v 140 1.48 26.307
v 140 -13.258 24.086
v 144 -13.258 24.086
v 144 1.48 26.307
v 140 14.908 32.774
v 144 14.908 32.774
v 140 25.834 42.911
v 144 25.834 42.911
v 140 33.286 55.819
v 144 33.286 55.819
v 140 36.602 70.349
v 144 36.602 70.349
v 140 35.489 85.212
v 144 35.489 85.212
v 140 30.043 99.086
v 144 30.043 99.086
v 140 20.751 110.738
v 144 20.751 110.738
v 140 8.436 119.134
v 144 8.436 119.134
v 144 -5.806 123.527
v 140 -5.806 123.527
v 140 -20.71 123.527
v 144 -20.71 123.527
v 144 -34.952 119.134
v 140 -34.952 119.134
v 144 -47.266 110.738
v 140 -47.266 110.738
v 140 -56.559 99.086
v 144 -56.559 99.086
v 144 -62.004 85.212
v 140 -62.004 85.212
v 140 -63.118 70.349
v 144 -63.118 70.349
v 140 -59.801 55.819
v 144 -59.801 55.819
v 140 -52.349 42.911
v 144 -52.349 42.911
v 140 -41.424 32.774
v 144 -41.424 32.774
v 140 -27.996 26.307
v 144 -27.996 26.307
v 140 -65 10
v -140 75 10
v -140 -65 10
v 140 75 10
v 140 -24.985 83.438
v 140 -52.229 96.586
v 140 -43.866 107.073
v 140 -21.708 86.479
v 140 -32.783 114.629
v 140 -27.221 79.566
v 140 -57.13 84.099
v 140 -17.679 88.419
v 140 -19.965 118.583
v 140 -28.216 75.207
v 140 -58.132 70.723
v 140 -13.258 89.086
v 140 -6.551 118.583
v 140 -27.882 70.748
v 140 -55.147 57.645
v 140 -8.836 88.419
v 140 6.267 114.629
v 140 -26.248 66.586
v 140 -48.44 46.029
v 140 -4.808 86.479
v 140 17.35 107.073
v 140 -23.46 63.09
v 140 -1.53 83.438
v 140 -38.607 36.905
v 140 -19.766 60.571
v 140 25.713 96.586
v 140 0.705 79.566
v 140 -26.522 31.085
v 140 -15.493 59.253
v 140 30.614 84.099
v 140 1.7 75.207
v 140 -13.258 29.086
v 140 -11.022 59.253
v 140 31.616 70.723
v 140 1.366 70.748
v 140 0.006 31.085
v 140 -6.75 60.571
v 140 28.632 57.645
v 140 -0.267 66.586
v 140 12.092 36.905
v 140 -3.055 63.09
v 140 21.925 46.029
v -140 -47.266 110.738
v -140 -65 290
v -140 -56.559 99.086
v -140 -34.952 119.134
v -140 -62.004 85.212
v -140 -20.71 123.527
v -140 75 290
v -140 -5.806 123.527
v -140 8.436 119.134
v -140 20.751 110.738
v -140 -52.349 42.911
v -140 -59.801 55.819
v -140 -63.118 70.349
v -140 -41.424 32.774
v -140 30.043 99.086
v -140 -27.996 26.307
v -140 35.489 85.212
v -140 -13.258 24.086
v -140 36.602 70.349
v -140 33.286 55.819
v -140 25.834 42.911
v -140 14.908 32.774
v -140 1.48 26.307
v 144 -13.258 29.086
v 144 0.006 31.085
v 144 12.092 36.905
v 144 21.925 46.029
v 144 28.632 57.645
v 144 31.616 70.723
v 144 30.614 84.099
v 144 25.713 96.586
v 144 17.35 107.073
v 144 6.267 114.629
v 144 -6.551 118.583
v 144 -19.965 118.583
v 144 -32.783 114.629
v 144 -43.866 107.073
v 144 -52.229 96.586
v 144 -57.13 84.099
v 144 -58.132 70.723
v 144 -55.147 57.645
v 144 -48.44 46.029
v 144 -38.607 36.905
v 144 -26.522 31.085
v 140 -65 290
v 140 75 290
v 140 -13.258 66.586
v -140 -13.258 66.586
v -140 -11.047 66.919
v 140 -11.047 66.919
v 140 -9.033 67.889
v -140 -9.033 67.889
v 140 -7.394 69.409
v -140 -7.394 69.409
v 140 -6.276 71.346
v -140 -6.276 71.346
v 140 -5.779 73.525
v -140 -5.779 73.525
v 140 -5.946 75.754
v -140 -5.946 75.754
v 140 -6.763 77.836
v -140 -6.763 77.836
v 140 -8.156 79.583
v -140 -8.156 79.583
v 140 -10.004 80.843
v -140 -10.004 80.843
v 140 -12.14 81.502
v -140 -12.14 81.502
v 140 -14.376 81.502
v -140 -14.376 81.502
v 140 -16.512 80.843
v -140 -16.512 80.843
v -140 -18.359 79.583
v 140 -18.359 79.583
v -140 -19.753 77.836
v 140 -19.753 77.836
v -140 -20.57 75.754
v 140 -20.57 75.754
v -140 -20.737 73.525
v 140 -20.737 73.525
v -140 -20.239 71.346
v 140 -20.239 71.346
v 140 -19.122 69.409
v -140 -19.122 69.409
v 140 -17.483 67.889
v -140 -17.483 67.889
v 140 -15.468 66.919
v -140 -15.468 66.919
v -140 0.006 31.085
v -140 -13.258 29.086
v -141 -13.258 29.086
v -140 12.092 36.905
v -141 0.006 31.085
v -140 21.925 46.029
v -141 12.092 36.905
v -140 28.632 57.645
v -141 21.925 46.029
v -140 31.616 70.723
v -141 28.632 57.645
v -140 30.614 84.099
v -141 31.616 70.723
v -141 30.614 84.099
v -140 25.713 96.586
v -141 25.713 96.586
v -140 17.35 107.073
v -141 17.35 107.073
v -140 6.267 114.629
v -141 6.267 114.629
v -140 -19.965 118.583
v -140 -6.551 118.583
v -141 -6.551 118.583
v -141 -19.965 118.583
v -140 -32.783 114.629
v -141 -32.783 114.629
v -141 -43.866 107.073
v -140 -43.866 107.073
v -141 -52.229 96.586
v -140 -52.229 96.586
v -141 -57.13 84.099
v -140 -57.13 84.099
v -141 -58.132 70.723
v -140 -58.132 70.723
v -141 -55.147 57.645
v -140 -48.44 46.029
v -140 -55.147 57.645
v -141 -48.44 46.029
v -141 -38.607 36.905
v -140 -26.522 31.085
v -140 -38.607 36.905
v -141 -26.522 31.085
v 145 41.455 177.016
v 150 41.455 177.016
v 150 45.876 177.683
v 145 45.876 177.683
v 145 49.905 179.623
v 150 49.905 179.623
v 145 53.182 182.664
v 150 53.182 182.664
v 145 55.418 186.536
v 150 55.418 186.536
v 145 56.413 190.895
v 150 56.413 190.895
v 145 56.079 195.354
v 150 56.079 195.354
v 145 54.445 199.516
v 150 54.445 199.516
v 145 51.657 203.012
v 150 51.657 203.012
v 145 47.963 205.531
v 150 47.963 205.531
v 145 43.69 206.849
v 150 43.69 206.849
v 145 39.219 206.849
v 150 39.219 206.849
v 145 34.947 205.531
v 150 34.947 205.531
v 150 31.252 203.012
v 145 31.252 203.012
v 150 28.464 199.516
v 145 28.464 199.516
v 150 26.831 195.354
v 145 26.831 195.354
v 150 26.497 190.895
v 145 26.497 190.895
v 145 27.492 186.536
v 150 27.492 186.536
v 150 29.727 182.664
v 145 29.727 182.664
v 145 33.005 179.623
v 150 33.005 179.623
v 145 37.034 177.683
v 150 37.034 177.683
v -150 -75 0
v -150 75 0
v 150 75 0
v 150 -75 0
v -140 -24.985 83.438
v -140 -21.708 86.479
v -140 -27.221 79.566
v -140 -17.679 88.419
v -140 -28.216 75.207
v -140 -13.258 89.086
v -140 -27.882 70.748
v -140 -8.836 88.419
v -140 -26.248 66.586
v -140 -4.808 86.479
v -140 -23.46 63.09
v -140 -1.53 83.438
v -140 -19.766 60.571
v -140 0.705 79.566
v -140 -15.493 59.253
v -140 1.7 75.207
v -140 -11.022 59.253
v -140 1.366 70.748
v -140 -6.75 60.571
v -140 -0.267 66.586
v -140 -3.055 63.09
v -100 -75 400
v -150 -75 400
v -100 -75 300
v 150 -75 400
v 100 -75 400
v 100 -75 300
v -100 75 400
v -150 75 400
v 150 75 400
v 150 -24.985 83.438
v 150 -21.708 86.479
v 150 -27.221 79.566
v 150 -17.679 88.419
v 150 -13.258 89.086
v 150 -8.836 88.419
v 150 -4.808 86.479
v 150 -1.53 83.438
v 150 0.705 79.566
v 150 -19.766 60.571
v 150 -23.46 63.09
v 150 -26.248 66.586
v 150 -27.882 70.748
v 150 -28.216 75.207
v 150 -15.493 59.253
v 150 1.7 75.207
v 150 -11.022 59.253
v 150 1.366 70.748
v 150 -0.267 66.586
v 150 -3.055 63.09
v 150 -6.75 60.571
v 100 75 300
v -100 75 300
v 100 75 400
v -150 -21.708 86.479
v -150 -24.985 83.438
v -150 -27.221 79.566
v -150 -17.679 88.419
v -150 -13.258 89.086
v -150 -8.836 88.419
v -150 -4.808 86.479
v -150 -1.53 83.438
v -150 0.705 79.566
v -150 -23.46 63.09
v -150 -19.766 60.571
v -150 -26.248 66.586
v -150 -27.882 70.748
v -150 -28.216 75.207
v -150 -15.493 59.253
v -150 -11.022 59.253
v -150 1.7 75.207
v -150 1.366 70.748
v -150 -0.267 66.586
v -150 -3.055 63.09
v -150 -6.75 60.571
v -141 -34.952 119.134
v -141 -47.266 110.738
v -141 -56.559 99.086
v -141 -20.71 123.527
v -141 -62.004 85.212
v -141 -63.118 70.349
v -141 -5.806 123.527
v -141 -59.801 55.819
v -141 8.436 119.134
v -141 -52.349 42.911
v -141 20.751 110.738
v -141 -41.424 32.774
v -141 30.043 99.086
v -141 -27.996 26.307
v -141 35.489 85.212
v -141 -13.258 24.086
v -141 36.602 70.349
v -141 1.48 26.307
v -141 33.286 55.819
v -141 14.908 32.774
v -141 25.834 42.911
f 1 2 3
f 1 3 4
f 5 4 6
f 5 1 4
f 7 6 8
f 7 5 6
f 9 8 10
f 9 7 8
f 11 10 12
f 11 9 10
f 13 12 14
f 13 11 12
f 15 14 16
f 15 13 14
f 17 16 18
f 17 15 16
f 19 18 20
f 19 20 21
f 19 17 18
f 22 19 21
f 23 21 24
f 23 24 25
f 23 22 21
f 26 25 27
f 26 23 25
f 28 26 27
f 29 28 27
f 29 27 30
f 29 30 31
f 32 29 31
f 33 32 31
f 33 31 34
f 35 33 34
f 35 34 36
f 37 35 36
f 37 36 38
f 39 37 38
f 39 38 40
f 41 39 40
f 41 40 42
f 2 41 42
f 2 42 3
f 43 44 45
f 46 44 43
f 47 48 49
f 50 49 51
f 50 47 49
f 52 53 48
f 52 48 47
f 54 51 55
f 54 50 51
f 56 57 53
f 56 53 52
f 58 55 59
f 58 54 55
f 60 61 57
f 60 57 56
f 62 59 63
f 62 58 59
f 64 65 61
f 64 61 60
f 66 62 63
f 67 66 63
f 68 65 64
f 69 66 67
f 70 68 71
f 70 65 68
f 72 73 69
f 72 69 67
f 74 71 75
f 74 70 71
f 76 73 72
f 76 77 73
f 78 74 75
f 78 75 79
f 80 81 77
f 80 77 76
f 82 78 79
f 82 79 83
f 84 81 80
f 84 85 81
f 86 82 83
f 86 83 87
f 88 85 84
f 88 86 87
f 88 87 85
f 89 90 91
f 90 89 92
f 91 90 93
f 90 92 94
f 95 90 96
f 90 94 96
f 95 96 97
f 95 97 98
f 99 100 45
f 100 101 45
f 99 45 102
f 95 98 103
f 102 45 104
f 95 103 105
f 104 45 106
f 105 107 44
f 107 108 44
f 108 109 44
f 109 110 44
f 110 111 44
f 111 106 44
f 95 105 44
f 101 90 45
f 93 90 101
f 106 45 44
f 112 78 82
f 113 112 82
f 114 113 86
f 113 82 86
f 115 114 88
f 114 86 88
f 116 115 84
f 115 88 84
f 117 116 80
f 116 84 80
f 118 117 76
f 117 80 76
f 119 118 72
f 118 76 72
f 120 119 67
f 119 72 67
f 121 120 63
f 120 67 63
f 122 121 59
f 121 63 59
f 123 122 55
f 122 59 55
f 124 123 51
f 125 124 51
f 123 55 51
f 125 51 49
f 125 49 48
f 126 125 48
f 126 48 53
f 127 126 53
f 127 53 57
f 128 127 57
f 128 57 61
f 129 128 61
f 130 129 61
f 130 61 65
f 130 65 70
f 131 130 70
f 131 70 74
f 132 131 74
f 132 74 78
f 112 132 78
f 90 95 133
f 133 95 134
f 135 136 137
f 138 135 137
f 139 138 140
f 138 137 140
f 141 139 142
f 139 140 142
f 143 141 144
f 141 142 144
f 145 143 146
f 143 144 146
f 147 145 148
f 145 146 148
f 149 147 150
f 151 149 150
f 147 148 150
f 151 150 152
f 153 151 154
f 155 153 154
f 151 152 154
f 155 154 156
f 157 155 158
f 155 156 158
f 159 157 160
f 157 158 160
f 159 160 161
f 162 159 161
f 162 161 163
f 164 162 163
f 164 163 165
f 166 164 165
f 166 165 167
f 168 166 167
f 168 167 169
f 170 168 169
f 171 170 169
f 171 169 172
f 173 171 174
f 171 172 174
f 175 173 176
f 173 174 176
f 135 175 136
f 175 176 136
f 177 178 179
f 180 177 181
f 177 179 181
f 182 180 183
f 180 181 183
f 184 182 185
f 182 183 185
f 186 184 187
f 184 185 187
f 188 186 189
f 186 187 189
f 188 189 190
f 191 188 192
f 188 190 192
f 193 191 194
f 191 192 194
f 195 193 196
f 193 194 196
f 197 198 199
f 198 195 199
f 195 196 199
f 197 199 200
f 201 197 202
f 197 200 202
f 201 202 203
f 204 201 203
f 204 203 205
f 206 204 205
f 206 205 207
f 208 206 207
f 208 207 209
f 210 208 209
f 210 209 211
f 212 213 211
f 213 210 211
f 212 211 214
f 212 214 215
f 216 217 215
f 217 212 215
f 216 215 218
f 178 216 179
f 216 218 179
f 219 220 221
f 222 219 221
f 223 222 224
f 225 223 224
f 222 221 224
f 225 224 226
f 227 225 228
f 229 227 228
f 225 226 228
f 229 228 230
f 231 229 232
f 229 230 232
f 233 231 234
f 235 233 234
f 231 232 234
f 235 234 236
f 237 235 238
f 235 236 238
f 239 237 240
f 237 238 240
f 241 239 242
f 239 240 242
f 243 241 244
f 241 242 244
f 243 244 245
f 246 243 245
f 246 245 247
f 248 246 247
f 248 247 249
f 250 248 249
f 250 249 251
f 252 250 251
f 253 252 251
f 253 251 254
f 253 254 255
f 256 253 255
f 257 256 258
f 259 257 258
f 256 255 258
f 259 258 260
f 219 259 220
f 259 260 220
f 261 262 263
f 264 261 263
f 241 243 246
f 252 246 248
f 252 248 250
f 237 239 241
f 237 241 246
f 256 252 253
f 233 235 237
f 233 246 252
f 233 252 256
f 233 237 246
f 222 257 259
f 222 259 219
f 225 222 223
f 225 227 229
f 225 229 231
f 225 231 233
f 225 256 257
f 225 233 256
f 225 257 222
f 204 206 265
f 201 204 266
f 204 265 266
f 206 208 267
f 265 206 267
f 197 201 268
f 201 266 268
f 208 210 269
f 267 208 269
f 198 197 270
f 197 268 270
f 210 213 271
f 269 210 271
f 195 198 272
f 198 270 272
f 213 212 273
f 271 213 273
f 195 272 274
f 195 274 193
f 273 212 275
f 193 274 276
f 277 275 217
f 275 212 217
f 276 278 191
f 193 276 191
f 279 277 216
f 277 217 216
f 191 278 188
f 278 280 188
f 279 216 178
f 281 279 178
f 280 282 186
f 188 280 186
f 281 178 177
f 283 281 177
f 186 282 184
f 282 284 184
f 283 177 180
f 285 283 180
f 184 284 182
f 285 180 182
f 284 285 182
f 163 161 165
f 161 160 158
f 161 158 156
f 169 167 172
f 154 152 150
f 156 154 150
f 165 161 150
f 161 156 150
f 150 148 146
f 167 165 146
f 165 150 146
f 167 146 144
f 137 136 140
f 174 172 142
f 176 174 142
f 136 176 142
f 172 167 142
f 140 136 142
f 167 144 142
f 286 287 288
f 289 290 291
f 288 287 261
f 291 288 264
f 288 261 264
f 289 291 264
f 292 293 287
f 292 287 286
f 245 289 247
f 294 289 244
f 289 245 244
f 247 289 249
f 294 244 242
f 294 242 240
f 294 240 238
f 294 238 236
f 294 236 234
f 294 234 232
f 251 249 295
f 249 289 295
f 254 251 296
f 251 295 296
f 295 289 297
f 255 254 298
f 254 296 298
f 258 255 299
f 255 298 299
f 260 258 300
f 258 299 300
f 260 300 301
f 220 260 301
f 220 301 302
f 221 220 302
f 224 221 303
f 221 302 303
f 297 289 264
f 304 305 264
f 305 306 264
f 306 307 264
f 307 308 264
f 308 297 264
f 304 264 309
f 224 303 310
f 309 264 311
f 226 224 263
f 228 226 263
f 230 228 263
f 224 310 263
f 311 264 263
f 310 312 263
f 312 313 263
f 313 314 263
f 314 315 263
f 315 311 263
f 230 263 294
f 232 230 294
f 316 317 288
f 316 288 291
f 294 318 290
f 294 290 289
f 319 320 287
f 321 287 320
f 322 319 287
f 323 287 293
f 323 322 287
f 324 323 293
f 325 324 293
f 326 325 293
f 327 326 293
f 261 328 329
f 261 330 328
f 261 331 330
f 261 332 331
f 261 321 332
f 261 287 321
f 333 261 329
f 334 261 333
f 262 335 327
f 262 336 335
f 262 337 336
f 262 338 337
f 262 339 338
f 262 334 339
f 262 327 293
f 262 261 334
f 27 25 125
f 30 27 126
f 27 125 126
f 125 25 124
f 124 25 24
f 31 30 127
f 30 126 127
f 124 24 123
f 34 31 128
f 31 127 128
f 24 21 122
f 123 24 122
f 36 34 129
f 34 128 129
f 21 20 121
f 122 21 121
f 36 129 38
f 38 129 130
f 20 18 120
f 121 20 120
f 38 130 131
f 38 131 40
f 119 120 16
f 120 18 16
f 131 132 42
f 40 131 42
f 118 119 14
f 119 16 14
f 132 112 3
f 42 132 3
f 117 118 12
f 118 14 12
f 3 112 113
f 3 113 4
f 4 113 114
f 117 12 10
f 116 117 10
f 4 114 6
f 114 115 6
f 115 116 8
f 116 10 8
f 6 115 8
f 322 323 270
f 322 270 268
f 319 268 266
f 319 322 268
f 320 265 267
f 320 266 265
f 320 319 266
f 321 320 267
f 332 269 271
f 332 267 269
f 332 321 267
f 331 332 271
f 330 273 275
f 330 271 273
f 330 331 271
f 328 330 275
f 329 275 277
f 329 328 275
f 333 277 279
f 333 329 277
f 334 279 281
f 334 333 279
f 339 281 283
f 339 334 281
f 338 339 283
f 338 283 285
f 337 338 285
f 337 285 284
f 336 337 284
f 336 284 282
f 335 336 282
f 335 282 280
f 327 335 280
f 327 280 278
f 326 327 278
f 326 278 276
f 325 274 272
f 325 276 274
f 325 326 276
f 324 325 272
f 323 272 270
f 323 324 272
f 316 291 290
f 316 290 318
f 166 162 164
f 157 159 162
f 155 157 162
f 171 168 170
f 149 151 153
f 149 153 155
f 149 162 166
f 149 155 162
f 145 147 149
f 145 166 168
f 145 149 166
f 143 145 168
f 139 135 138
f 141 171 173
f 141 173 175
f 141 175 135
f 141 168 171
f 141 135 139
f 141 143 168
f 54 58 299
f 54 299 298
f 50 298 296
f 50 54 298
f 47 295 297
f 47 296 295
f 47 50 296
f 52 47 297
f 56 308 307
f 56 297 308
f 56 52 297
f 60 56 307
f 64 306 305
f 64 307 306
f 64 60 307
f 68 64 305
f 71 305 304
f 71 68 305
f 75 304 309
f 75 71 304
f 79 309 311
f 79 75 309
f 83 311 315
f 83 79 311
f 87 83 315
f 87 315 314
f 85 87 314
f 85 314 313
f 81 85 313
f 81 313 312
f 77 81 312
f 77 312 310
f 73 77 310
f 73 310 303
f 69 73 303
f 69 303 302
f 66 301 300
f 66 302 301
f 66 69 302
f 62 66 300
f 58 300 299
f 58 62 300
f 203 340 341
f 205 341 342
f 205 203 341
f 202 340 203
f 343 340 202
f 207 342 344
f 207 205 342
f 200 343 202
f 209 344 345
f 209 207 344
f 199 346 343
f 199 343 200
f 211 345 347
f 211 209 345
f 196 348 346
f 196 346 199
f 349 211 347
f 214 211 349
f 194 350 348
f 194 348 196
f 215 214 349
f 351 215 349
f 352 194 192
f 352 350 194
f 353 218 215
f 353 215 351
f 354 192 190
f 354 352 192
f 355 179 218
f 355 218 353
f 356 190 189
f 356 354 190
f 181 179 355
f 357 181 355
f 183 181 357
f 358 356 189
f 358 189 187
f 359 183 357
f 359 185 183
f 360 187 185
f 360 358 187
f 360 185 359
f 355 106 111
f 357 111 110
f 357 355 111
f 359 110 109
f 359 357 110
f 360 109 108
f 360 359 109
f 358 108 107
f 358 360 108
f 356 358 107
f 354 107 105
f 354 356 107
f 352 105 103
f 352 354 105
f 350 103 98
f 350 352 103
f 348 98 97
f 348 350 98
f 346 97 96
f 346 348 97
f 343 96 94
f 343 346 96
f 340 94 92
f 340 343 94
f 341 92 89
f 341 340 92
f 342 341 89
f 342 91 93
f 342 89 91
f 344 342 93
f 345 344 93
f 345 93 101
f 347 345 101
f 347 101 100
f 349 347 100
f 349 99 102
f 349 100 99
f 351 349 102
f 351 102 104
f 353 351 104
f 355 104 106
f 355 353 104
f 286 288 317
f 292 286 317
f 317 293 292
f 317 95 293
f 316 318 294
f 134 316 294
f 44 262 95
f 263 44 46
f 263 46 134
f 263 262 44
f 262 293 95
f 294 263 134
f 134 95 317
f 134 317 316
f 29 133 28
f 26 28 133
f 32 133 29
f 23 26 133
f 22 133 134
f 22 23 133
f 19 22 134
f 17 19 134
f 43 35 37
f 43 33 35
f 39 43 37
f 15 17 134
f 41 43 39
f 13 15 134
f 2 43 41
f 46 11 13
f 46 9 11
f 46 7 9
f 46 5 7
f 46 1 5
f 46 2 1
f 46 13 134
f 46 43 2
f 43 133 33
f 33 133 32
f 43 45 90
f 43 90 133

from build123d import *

# Parameters (mm, degrees)
SKETCH1_W               = 300
SKETCH1_H               = 150
BOSS_EXTRUDE1_DEPTH     = 300
SHELL1_T                = -10
CUT_EXTRUDE2_DEPTH      = 284
CUT_EXTRUDE2_DEPTH_BACK = 1
SKETCH2_R               = 50
SKETCH2_R_2             = 45
CUT_EXTRUDE3_DEPTH      = 361
CUT_EXTRUDE3_DEPTH_BACK = 95
SKETCH8_R               = 15
SKETCH9_R               = 7.5
BOSS_EXTRUDE2_DEPTH     = 280
SKETCH14_W              = 50
SKETCH14_H              = 150
BOSS_EXTRUDE4_DEPTH     = 100
SKETCH15_R              = 15
CUT_EXTRUDE6_DEPTH      = 5


with BuildPart() as part:
    # Sketch1 → Boss-Extrude1 (new body)
    with BuildSketch(Plane.XY):
        Rectangle(SKETCH1_W, SKETCH1_H)
    extrude(amount=BOSS_EXTRUDE1_DEPTH)

    # Shell1
    shell1_openings = [part.faces().sort_by_distance(p)[0] for p in [
        (0, 75, 150),
    ]]
    offset(amount=SHELL1_T, openings=shell1_openings, kind=Kind.INTERSECTION)

    # Sketch2 → Cut-Extrude2 (cut, two sides: drawn at the far end of the back side and taken through both)
    with BuildSketch(Plane(origin=(-140, 0, 0), x_dir=(0, 0, -1), z_dir=(1, 0, 0)).offset(-CUT_EXTRUDE2_DEPTH_BACK)):
        with Locations((-74.085565492, -13.257784017)):
            Circle(SKETCH2_R)
        with Locations((-74.085565492, -13.257784017)):
            Circle(SKETCH2_R_2, mode=Mode.SUBTRACT)
    extrude(amount=CUT_EXTRUDE2_DEPTH + CUT_EXTRUDE2_DEPTH_BACK, mode=Mode.SUBTRACT)

    # Sketch8 → Cut-Extrude3 (cut, two sides: drawn at the far end of the back side and taken through both)
    with BuildSketch(Plane(origin=(-140, 0, 0), x_dir=(0, 0, -1), z_dir=(1, 0, 0)).offset(-CUT_EXTRUDE3_DEPTH_BACK)):
        with Locations(Location((-74.085565492, -13.257784017, 0), (0, 0, 180))):
            Circle(SKETCH8_R)
    extrude(amount=CUT_EXTRUDE3_DEPTH + CUT_EXTRUDE3_DEPTH_BACK, mode=Mode.SUBTRACT)

    # Sketch14 → Boss-Extrude4 (add)
    with BuildSketch(Plane.XY.offset(300)):
        with Locations((-125, 0)):
            Rectangle(SKETCH14_W, SKETCH14_H)
        with Locations((125, 0)):
            Rectangle(SKETCH14_W, SKETCH14_H)
    extrude(amount=BOSS_EXTRUDE4_DEPTH)

    # Sketch15 → Cut-Extrude6 (cut)
    with BuildSketch(Plane(origin=(150, 0, 0), x_dir=(0, 0, -1), z_dir=(1, 0, 0))):
        with Locations((-192.016194133, 41.454862356)):
            Circle(SKETCH15_R)
    extrude(amount=-CUT_EXTRUDE6_DEPTH, mode=Mode.SUBTRACT)


with BuildPart() as body_2:
    # Sketch9 → Boss-Extrude2 (new body)
    with BuildSketch(Plane(origin=(-140, 0, 0), x_dir=(0, 0, -1), z_dir=(1, 0, 0))):
        with Locations((-74.085565492, -13.257784017)):
            Circle(SKETCH9_R)
    extrude(amount=BOSS_EXTRUDE2_DEPTH)


solid = Compound([part.part, body_2.part])
